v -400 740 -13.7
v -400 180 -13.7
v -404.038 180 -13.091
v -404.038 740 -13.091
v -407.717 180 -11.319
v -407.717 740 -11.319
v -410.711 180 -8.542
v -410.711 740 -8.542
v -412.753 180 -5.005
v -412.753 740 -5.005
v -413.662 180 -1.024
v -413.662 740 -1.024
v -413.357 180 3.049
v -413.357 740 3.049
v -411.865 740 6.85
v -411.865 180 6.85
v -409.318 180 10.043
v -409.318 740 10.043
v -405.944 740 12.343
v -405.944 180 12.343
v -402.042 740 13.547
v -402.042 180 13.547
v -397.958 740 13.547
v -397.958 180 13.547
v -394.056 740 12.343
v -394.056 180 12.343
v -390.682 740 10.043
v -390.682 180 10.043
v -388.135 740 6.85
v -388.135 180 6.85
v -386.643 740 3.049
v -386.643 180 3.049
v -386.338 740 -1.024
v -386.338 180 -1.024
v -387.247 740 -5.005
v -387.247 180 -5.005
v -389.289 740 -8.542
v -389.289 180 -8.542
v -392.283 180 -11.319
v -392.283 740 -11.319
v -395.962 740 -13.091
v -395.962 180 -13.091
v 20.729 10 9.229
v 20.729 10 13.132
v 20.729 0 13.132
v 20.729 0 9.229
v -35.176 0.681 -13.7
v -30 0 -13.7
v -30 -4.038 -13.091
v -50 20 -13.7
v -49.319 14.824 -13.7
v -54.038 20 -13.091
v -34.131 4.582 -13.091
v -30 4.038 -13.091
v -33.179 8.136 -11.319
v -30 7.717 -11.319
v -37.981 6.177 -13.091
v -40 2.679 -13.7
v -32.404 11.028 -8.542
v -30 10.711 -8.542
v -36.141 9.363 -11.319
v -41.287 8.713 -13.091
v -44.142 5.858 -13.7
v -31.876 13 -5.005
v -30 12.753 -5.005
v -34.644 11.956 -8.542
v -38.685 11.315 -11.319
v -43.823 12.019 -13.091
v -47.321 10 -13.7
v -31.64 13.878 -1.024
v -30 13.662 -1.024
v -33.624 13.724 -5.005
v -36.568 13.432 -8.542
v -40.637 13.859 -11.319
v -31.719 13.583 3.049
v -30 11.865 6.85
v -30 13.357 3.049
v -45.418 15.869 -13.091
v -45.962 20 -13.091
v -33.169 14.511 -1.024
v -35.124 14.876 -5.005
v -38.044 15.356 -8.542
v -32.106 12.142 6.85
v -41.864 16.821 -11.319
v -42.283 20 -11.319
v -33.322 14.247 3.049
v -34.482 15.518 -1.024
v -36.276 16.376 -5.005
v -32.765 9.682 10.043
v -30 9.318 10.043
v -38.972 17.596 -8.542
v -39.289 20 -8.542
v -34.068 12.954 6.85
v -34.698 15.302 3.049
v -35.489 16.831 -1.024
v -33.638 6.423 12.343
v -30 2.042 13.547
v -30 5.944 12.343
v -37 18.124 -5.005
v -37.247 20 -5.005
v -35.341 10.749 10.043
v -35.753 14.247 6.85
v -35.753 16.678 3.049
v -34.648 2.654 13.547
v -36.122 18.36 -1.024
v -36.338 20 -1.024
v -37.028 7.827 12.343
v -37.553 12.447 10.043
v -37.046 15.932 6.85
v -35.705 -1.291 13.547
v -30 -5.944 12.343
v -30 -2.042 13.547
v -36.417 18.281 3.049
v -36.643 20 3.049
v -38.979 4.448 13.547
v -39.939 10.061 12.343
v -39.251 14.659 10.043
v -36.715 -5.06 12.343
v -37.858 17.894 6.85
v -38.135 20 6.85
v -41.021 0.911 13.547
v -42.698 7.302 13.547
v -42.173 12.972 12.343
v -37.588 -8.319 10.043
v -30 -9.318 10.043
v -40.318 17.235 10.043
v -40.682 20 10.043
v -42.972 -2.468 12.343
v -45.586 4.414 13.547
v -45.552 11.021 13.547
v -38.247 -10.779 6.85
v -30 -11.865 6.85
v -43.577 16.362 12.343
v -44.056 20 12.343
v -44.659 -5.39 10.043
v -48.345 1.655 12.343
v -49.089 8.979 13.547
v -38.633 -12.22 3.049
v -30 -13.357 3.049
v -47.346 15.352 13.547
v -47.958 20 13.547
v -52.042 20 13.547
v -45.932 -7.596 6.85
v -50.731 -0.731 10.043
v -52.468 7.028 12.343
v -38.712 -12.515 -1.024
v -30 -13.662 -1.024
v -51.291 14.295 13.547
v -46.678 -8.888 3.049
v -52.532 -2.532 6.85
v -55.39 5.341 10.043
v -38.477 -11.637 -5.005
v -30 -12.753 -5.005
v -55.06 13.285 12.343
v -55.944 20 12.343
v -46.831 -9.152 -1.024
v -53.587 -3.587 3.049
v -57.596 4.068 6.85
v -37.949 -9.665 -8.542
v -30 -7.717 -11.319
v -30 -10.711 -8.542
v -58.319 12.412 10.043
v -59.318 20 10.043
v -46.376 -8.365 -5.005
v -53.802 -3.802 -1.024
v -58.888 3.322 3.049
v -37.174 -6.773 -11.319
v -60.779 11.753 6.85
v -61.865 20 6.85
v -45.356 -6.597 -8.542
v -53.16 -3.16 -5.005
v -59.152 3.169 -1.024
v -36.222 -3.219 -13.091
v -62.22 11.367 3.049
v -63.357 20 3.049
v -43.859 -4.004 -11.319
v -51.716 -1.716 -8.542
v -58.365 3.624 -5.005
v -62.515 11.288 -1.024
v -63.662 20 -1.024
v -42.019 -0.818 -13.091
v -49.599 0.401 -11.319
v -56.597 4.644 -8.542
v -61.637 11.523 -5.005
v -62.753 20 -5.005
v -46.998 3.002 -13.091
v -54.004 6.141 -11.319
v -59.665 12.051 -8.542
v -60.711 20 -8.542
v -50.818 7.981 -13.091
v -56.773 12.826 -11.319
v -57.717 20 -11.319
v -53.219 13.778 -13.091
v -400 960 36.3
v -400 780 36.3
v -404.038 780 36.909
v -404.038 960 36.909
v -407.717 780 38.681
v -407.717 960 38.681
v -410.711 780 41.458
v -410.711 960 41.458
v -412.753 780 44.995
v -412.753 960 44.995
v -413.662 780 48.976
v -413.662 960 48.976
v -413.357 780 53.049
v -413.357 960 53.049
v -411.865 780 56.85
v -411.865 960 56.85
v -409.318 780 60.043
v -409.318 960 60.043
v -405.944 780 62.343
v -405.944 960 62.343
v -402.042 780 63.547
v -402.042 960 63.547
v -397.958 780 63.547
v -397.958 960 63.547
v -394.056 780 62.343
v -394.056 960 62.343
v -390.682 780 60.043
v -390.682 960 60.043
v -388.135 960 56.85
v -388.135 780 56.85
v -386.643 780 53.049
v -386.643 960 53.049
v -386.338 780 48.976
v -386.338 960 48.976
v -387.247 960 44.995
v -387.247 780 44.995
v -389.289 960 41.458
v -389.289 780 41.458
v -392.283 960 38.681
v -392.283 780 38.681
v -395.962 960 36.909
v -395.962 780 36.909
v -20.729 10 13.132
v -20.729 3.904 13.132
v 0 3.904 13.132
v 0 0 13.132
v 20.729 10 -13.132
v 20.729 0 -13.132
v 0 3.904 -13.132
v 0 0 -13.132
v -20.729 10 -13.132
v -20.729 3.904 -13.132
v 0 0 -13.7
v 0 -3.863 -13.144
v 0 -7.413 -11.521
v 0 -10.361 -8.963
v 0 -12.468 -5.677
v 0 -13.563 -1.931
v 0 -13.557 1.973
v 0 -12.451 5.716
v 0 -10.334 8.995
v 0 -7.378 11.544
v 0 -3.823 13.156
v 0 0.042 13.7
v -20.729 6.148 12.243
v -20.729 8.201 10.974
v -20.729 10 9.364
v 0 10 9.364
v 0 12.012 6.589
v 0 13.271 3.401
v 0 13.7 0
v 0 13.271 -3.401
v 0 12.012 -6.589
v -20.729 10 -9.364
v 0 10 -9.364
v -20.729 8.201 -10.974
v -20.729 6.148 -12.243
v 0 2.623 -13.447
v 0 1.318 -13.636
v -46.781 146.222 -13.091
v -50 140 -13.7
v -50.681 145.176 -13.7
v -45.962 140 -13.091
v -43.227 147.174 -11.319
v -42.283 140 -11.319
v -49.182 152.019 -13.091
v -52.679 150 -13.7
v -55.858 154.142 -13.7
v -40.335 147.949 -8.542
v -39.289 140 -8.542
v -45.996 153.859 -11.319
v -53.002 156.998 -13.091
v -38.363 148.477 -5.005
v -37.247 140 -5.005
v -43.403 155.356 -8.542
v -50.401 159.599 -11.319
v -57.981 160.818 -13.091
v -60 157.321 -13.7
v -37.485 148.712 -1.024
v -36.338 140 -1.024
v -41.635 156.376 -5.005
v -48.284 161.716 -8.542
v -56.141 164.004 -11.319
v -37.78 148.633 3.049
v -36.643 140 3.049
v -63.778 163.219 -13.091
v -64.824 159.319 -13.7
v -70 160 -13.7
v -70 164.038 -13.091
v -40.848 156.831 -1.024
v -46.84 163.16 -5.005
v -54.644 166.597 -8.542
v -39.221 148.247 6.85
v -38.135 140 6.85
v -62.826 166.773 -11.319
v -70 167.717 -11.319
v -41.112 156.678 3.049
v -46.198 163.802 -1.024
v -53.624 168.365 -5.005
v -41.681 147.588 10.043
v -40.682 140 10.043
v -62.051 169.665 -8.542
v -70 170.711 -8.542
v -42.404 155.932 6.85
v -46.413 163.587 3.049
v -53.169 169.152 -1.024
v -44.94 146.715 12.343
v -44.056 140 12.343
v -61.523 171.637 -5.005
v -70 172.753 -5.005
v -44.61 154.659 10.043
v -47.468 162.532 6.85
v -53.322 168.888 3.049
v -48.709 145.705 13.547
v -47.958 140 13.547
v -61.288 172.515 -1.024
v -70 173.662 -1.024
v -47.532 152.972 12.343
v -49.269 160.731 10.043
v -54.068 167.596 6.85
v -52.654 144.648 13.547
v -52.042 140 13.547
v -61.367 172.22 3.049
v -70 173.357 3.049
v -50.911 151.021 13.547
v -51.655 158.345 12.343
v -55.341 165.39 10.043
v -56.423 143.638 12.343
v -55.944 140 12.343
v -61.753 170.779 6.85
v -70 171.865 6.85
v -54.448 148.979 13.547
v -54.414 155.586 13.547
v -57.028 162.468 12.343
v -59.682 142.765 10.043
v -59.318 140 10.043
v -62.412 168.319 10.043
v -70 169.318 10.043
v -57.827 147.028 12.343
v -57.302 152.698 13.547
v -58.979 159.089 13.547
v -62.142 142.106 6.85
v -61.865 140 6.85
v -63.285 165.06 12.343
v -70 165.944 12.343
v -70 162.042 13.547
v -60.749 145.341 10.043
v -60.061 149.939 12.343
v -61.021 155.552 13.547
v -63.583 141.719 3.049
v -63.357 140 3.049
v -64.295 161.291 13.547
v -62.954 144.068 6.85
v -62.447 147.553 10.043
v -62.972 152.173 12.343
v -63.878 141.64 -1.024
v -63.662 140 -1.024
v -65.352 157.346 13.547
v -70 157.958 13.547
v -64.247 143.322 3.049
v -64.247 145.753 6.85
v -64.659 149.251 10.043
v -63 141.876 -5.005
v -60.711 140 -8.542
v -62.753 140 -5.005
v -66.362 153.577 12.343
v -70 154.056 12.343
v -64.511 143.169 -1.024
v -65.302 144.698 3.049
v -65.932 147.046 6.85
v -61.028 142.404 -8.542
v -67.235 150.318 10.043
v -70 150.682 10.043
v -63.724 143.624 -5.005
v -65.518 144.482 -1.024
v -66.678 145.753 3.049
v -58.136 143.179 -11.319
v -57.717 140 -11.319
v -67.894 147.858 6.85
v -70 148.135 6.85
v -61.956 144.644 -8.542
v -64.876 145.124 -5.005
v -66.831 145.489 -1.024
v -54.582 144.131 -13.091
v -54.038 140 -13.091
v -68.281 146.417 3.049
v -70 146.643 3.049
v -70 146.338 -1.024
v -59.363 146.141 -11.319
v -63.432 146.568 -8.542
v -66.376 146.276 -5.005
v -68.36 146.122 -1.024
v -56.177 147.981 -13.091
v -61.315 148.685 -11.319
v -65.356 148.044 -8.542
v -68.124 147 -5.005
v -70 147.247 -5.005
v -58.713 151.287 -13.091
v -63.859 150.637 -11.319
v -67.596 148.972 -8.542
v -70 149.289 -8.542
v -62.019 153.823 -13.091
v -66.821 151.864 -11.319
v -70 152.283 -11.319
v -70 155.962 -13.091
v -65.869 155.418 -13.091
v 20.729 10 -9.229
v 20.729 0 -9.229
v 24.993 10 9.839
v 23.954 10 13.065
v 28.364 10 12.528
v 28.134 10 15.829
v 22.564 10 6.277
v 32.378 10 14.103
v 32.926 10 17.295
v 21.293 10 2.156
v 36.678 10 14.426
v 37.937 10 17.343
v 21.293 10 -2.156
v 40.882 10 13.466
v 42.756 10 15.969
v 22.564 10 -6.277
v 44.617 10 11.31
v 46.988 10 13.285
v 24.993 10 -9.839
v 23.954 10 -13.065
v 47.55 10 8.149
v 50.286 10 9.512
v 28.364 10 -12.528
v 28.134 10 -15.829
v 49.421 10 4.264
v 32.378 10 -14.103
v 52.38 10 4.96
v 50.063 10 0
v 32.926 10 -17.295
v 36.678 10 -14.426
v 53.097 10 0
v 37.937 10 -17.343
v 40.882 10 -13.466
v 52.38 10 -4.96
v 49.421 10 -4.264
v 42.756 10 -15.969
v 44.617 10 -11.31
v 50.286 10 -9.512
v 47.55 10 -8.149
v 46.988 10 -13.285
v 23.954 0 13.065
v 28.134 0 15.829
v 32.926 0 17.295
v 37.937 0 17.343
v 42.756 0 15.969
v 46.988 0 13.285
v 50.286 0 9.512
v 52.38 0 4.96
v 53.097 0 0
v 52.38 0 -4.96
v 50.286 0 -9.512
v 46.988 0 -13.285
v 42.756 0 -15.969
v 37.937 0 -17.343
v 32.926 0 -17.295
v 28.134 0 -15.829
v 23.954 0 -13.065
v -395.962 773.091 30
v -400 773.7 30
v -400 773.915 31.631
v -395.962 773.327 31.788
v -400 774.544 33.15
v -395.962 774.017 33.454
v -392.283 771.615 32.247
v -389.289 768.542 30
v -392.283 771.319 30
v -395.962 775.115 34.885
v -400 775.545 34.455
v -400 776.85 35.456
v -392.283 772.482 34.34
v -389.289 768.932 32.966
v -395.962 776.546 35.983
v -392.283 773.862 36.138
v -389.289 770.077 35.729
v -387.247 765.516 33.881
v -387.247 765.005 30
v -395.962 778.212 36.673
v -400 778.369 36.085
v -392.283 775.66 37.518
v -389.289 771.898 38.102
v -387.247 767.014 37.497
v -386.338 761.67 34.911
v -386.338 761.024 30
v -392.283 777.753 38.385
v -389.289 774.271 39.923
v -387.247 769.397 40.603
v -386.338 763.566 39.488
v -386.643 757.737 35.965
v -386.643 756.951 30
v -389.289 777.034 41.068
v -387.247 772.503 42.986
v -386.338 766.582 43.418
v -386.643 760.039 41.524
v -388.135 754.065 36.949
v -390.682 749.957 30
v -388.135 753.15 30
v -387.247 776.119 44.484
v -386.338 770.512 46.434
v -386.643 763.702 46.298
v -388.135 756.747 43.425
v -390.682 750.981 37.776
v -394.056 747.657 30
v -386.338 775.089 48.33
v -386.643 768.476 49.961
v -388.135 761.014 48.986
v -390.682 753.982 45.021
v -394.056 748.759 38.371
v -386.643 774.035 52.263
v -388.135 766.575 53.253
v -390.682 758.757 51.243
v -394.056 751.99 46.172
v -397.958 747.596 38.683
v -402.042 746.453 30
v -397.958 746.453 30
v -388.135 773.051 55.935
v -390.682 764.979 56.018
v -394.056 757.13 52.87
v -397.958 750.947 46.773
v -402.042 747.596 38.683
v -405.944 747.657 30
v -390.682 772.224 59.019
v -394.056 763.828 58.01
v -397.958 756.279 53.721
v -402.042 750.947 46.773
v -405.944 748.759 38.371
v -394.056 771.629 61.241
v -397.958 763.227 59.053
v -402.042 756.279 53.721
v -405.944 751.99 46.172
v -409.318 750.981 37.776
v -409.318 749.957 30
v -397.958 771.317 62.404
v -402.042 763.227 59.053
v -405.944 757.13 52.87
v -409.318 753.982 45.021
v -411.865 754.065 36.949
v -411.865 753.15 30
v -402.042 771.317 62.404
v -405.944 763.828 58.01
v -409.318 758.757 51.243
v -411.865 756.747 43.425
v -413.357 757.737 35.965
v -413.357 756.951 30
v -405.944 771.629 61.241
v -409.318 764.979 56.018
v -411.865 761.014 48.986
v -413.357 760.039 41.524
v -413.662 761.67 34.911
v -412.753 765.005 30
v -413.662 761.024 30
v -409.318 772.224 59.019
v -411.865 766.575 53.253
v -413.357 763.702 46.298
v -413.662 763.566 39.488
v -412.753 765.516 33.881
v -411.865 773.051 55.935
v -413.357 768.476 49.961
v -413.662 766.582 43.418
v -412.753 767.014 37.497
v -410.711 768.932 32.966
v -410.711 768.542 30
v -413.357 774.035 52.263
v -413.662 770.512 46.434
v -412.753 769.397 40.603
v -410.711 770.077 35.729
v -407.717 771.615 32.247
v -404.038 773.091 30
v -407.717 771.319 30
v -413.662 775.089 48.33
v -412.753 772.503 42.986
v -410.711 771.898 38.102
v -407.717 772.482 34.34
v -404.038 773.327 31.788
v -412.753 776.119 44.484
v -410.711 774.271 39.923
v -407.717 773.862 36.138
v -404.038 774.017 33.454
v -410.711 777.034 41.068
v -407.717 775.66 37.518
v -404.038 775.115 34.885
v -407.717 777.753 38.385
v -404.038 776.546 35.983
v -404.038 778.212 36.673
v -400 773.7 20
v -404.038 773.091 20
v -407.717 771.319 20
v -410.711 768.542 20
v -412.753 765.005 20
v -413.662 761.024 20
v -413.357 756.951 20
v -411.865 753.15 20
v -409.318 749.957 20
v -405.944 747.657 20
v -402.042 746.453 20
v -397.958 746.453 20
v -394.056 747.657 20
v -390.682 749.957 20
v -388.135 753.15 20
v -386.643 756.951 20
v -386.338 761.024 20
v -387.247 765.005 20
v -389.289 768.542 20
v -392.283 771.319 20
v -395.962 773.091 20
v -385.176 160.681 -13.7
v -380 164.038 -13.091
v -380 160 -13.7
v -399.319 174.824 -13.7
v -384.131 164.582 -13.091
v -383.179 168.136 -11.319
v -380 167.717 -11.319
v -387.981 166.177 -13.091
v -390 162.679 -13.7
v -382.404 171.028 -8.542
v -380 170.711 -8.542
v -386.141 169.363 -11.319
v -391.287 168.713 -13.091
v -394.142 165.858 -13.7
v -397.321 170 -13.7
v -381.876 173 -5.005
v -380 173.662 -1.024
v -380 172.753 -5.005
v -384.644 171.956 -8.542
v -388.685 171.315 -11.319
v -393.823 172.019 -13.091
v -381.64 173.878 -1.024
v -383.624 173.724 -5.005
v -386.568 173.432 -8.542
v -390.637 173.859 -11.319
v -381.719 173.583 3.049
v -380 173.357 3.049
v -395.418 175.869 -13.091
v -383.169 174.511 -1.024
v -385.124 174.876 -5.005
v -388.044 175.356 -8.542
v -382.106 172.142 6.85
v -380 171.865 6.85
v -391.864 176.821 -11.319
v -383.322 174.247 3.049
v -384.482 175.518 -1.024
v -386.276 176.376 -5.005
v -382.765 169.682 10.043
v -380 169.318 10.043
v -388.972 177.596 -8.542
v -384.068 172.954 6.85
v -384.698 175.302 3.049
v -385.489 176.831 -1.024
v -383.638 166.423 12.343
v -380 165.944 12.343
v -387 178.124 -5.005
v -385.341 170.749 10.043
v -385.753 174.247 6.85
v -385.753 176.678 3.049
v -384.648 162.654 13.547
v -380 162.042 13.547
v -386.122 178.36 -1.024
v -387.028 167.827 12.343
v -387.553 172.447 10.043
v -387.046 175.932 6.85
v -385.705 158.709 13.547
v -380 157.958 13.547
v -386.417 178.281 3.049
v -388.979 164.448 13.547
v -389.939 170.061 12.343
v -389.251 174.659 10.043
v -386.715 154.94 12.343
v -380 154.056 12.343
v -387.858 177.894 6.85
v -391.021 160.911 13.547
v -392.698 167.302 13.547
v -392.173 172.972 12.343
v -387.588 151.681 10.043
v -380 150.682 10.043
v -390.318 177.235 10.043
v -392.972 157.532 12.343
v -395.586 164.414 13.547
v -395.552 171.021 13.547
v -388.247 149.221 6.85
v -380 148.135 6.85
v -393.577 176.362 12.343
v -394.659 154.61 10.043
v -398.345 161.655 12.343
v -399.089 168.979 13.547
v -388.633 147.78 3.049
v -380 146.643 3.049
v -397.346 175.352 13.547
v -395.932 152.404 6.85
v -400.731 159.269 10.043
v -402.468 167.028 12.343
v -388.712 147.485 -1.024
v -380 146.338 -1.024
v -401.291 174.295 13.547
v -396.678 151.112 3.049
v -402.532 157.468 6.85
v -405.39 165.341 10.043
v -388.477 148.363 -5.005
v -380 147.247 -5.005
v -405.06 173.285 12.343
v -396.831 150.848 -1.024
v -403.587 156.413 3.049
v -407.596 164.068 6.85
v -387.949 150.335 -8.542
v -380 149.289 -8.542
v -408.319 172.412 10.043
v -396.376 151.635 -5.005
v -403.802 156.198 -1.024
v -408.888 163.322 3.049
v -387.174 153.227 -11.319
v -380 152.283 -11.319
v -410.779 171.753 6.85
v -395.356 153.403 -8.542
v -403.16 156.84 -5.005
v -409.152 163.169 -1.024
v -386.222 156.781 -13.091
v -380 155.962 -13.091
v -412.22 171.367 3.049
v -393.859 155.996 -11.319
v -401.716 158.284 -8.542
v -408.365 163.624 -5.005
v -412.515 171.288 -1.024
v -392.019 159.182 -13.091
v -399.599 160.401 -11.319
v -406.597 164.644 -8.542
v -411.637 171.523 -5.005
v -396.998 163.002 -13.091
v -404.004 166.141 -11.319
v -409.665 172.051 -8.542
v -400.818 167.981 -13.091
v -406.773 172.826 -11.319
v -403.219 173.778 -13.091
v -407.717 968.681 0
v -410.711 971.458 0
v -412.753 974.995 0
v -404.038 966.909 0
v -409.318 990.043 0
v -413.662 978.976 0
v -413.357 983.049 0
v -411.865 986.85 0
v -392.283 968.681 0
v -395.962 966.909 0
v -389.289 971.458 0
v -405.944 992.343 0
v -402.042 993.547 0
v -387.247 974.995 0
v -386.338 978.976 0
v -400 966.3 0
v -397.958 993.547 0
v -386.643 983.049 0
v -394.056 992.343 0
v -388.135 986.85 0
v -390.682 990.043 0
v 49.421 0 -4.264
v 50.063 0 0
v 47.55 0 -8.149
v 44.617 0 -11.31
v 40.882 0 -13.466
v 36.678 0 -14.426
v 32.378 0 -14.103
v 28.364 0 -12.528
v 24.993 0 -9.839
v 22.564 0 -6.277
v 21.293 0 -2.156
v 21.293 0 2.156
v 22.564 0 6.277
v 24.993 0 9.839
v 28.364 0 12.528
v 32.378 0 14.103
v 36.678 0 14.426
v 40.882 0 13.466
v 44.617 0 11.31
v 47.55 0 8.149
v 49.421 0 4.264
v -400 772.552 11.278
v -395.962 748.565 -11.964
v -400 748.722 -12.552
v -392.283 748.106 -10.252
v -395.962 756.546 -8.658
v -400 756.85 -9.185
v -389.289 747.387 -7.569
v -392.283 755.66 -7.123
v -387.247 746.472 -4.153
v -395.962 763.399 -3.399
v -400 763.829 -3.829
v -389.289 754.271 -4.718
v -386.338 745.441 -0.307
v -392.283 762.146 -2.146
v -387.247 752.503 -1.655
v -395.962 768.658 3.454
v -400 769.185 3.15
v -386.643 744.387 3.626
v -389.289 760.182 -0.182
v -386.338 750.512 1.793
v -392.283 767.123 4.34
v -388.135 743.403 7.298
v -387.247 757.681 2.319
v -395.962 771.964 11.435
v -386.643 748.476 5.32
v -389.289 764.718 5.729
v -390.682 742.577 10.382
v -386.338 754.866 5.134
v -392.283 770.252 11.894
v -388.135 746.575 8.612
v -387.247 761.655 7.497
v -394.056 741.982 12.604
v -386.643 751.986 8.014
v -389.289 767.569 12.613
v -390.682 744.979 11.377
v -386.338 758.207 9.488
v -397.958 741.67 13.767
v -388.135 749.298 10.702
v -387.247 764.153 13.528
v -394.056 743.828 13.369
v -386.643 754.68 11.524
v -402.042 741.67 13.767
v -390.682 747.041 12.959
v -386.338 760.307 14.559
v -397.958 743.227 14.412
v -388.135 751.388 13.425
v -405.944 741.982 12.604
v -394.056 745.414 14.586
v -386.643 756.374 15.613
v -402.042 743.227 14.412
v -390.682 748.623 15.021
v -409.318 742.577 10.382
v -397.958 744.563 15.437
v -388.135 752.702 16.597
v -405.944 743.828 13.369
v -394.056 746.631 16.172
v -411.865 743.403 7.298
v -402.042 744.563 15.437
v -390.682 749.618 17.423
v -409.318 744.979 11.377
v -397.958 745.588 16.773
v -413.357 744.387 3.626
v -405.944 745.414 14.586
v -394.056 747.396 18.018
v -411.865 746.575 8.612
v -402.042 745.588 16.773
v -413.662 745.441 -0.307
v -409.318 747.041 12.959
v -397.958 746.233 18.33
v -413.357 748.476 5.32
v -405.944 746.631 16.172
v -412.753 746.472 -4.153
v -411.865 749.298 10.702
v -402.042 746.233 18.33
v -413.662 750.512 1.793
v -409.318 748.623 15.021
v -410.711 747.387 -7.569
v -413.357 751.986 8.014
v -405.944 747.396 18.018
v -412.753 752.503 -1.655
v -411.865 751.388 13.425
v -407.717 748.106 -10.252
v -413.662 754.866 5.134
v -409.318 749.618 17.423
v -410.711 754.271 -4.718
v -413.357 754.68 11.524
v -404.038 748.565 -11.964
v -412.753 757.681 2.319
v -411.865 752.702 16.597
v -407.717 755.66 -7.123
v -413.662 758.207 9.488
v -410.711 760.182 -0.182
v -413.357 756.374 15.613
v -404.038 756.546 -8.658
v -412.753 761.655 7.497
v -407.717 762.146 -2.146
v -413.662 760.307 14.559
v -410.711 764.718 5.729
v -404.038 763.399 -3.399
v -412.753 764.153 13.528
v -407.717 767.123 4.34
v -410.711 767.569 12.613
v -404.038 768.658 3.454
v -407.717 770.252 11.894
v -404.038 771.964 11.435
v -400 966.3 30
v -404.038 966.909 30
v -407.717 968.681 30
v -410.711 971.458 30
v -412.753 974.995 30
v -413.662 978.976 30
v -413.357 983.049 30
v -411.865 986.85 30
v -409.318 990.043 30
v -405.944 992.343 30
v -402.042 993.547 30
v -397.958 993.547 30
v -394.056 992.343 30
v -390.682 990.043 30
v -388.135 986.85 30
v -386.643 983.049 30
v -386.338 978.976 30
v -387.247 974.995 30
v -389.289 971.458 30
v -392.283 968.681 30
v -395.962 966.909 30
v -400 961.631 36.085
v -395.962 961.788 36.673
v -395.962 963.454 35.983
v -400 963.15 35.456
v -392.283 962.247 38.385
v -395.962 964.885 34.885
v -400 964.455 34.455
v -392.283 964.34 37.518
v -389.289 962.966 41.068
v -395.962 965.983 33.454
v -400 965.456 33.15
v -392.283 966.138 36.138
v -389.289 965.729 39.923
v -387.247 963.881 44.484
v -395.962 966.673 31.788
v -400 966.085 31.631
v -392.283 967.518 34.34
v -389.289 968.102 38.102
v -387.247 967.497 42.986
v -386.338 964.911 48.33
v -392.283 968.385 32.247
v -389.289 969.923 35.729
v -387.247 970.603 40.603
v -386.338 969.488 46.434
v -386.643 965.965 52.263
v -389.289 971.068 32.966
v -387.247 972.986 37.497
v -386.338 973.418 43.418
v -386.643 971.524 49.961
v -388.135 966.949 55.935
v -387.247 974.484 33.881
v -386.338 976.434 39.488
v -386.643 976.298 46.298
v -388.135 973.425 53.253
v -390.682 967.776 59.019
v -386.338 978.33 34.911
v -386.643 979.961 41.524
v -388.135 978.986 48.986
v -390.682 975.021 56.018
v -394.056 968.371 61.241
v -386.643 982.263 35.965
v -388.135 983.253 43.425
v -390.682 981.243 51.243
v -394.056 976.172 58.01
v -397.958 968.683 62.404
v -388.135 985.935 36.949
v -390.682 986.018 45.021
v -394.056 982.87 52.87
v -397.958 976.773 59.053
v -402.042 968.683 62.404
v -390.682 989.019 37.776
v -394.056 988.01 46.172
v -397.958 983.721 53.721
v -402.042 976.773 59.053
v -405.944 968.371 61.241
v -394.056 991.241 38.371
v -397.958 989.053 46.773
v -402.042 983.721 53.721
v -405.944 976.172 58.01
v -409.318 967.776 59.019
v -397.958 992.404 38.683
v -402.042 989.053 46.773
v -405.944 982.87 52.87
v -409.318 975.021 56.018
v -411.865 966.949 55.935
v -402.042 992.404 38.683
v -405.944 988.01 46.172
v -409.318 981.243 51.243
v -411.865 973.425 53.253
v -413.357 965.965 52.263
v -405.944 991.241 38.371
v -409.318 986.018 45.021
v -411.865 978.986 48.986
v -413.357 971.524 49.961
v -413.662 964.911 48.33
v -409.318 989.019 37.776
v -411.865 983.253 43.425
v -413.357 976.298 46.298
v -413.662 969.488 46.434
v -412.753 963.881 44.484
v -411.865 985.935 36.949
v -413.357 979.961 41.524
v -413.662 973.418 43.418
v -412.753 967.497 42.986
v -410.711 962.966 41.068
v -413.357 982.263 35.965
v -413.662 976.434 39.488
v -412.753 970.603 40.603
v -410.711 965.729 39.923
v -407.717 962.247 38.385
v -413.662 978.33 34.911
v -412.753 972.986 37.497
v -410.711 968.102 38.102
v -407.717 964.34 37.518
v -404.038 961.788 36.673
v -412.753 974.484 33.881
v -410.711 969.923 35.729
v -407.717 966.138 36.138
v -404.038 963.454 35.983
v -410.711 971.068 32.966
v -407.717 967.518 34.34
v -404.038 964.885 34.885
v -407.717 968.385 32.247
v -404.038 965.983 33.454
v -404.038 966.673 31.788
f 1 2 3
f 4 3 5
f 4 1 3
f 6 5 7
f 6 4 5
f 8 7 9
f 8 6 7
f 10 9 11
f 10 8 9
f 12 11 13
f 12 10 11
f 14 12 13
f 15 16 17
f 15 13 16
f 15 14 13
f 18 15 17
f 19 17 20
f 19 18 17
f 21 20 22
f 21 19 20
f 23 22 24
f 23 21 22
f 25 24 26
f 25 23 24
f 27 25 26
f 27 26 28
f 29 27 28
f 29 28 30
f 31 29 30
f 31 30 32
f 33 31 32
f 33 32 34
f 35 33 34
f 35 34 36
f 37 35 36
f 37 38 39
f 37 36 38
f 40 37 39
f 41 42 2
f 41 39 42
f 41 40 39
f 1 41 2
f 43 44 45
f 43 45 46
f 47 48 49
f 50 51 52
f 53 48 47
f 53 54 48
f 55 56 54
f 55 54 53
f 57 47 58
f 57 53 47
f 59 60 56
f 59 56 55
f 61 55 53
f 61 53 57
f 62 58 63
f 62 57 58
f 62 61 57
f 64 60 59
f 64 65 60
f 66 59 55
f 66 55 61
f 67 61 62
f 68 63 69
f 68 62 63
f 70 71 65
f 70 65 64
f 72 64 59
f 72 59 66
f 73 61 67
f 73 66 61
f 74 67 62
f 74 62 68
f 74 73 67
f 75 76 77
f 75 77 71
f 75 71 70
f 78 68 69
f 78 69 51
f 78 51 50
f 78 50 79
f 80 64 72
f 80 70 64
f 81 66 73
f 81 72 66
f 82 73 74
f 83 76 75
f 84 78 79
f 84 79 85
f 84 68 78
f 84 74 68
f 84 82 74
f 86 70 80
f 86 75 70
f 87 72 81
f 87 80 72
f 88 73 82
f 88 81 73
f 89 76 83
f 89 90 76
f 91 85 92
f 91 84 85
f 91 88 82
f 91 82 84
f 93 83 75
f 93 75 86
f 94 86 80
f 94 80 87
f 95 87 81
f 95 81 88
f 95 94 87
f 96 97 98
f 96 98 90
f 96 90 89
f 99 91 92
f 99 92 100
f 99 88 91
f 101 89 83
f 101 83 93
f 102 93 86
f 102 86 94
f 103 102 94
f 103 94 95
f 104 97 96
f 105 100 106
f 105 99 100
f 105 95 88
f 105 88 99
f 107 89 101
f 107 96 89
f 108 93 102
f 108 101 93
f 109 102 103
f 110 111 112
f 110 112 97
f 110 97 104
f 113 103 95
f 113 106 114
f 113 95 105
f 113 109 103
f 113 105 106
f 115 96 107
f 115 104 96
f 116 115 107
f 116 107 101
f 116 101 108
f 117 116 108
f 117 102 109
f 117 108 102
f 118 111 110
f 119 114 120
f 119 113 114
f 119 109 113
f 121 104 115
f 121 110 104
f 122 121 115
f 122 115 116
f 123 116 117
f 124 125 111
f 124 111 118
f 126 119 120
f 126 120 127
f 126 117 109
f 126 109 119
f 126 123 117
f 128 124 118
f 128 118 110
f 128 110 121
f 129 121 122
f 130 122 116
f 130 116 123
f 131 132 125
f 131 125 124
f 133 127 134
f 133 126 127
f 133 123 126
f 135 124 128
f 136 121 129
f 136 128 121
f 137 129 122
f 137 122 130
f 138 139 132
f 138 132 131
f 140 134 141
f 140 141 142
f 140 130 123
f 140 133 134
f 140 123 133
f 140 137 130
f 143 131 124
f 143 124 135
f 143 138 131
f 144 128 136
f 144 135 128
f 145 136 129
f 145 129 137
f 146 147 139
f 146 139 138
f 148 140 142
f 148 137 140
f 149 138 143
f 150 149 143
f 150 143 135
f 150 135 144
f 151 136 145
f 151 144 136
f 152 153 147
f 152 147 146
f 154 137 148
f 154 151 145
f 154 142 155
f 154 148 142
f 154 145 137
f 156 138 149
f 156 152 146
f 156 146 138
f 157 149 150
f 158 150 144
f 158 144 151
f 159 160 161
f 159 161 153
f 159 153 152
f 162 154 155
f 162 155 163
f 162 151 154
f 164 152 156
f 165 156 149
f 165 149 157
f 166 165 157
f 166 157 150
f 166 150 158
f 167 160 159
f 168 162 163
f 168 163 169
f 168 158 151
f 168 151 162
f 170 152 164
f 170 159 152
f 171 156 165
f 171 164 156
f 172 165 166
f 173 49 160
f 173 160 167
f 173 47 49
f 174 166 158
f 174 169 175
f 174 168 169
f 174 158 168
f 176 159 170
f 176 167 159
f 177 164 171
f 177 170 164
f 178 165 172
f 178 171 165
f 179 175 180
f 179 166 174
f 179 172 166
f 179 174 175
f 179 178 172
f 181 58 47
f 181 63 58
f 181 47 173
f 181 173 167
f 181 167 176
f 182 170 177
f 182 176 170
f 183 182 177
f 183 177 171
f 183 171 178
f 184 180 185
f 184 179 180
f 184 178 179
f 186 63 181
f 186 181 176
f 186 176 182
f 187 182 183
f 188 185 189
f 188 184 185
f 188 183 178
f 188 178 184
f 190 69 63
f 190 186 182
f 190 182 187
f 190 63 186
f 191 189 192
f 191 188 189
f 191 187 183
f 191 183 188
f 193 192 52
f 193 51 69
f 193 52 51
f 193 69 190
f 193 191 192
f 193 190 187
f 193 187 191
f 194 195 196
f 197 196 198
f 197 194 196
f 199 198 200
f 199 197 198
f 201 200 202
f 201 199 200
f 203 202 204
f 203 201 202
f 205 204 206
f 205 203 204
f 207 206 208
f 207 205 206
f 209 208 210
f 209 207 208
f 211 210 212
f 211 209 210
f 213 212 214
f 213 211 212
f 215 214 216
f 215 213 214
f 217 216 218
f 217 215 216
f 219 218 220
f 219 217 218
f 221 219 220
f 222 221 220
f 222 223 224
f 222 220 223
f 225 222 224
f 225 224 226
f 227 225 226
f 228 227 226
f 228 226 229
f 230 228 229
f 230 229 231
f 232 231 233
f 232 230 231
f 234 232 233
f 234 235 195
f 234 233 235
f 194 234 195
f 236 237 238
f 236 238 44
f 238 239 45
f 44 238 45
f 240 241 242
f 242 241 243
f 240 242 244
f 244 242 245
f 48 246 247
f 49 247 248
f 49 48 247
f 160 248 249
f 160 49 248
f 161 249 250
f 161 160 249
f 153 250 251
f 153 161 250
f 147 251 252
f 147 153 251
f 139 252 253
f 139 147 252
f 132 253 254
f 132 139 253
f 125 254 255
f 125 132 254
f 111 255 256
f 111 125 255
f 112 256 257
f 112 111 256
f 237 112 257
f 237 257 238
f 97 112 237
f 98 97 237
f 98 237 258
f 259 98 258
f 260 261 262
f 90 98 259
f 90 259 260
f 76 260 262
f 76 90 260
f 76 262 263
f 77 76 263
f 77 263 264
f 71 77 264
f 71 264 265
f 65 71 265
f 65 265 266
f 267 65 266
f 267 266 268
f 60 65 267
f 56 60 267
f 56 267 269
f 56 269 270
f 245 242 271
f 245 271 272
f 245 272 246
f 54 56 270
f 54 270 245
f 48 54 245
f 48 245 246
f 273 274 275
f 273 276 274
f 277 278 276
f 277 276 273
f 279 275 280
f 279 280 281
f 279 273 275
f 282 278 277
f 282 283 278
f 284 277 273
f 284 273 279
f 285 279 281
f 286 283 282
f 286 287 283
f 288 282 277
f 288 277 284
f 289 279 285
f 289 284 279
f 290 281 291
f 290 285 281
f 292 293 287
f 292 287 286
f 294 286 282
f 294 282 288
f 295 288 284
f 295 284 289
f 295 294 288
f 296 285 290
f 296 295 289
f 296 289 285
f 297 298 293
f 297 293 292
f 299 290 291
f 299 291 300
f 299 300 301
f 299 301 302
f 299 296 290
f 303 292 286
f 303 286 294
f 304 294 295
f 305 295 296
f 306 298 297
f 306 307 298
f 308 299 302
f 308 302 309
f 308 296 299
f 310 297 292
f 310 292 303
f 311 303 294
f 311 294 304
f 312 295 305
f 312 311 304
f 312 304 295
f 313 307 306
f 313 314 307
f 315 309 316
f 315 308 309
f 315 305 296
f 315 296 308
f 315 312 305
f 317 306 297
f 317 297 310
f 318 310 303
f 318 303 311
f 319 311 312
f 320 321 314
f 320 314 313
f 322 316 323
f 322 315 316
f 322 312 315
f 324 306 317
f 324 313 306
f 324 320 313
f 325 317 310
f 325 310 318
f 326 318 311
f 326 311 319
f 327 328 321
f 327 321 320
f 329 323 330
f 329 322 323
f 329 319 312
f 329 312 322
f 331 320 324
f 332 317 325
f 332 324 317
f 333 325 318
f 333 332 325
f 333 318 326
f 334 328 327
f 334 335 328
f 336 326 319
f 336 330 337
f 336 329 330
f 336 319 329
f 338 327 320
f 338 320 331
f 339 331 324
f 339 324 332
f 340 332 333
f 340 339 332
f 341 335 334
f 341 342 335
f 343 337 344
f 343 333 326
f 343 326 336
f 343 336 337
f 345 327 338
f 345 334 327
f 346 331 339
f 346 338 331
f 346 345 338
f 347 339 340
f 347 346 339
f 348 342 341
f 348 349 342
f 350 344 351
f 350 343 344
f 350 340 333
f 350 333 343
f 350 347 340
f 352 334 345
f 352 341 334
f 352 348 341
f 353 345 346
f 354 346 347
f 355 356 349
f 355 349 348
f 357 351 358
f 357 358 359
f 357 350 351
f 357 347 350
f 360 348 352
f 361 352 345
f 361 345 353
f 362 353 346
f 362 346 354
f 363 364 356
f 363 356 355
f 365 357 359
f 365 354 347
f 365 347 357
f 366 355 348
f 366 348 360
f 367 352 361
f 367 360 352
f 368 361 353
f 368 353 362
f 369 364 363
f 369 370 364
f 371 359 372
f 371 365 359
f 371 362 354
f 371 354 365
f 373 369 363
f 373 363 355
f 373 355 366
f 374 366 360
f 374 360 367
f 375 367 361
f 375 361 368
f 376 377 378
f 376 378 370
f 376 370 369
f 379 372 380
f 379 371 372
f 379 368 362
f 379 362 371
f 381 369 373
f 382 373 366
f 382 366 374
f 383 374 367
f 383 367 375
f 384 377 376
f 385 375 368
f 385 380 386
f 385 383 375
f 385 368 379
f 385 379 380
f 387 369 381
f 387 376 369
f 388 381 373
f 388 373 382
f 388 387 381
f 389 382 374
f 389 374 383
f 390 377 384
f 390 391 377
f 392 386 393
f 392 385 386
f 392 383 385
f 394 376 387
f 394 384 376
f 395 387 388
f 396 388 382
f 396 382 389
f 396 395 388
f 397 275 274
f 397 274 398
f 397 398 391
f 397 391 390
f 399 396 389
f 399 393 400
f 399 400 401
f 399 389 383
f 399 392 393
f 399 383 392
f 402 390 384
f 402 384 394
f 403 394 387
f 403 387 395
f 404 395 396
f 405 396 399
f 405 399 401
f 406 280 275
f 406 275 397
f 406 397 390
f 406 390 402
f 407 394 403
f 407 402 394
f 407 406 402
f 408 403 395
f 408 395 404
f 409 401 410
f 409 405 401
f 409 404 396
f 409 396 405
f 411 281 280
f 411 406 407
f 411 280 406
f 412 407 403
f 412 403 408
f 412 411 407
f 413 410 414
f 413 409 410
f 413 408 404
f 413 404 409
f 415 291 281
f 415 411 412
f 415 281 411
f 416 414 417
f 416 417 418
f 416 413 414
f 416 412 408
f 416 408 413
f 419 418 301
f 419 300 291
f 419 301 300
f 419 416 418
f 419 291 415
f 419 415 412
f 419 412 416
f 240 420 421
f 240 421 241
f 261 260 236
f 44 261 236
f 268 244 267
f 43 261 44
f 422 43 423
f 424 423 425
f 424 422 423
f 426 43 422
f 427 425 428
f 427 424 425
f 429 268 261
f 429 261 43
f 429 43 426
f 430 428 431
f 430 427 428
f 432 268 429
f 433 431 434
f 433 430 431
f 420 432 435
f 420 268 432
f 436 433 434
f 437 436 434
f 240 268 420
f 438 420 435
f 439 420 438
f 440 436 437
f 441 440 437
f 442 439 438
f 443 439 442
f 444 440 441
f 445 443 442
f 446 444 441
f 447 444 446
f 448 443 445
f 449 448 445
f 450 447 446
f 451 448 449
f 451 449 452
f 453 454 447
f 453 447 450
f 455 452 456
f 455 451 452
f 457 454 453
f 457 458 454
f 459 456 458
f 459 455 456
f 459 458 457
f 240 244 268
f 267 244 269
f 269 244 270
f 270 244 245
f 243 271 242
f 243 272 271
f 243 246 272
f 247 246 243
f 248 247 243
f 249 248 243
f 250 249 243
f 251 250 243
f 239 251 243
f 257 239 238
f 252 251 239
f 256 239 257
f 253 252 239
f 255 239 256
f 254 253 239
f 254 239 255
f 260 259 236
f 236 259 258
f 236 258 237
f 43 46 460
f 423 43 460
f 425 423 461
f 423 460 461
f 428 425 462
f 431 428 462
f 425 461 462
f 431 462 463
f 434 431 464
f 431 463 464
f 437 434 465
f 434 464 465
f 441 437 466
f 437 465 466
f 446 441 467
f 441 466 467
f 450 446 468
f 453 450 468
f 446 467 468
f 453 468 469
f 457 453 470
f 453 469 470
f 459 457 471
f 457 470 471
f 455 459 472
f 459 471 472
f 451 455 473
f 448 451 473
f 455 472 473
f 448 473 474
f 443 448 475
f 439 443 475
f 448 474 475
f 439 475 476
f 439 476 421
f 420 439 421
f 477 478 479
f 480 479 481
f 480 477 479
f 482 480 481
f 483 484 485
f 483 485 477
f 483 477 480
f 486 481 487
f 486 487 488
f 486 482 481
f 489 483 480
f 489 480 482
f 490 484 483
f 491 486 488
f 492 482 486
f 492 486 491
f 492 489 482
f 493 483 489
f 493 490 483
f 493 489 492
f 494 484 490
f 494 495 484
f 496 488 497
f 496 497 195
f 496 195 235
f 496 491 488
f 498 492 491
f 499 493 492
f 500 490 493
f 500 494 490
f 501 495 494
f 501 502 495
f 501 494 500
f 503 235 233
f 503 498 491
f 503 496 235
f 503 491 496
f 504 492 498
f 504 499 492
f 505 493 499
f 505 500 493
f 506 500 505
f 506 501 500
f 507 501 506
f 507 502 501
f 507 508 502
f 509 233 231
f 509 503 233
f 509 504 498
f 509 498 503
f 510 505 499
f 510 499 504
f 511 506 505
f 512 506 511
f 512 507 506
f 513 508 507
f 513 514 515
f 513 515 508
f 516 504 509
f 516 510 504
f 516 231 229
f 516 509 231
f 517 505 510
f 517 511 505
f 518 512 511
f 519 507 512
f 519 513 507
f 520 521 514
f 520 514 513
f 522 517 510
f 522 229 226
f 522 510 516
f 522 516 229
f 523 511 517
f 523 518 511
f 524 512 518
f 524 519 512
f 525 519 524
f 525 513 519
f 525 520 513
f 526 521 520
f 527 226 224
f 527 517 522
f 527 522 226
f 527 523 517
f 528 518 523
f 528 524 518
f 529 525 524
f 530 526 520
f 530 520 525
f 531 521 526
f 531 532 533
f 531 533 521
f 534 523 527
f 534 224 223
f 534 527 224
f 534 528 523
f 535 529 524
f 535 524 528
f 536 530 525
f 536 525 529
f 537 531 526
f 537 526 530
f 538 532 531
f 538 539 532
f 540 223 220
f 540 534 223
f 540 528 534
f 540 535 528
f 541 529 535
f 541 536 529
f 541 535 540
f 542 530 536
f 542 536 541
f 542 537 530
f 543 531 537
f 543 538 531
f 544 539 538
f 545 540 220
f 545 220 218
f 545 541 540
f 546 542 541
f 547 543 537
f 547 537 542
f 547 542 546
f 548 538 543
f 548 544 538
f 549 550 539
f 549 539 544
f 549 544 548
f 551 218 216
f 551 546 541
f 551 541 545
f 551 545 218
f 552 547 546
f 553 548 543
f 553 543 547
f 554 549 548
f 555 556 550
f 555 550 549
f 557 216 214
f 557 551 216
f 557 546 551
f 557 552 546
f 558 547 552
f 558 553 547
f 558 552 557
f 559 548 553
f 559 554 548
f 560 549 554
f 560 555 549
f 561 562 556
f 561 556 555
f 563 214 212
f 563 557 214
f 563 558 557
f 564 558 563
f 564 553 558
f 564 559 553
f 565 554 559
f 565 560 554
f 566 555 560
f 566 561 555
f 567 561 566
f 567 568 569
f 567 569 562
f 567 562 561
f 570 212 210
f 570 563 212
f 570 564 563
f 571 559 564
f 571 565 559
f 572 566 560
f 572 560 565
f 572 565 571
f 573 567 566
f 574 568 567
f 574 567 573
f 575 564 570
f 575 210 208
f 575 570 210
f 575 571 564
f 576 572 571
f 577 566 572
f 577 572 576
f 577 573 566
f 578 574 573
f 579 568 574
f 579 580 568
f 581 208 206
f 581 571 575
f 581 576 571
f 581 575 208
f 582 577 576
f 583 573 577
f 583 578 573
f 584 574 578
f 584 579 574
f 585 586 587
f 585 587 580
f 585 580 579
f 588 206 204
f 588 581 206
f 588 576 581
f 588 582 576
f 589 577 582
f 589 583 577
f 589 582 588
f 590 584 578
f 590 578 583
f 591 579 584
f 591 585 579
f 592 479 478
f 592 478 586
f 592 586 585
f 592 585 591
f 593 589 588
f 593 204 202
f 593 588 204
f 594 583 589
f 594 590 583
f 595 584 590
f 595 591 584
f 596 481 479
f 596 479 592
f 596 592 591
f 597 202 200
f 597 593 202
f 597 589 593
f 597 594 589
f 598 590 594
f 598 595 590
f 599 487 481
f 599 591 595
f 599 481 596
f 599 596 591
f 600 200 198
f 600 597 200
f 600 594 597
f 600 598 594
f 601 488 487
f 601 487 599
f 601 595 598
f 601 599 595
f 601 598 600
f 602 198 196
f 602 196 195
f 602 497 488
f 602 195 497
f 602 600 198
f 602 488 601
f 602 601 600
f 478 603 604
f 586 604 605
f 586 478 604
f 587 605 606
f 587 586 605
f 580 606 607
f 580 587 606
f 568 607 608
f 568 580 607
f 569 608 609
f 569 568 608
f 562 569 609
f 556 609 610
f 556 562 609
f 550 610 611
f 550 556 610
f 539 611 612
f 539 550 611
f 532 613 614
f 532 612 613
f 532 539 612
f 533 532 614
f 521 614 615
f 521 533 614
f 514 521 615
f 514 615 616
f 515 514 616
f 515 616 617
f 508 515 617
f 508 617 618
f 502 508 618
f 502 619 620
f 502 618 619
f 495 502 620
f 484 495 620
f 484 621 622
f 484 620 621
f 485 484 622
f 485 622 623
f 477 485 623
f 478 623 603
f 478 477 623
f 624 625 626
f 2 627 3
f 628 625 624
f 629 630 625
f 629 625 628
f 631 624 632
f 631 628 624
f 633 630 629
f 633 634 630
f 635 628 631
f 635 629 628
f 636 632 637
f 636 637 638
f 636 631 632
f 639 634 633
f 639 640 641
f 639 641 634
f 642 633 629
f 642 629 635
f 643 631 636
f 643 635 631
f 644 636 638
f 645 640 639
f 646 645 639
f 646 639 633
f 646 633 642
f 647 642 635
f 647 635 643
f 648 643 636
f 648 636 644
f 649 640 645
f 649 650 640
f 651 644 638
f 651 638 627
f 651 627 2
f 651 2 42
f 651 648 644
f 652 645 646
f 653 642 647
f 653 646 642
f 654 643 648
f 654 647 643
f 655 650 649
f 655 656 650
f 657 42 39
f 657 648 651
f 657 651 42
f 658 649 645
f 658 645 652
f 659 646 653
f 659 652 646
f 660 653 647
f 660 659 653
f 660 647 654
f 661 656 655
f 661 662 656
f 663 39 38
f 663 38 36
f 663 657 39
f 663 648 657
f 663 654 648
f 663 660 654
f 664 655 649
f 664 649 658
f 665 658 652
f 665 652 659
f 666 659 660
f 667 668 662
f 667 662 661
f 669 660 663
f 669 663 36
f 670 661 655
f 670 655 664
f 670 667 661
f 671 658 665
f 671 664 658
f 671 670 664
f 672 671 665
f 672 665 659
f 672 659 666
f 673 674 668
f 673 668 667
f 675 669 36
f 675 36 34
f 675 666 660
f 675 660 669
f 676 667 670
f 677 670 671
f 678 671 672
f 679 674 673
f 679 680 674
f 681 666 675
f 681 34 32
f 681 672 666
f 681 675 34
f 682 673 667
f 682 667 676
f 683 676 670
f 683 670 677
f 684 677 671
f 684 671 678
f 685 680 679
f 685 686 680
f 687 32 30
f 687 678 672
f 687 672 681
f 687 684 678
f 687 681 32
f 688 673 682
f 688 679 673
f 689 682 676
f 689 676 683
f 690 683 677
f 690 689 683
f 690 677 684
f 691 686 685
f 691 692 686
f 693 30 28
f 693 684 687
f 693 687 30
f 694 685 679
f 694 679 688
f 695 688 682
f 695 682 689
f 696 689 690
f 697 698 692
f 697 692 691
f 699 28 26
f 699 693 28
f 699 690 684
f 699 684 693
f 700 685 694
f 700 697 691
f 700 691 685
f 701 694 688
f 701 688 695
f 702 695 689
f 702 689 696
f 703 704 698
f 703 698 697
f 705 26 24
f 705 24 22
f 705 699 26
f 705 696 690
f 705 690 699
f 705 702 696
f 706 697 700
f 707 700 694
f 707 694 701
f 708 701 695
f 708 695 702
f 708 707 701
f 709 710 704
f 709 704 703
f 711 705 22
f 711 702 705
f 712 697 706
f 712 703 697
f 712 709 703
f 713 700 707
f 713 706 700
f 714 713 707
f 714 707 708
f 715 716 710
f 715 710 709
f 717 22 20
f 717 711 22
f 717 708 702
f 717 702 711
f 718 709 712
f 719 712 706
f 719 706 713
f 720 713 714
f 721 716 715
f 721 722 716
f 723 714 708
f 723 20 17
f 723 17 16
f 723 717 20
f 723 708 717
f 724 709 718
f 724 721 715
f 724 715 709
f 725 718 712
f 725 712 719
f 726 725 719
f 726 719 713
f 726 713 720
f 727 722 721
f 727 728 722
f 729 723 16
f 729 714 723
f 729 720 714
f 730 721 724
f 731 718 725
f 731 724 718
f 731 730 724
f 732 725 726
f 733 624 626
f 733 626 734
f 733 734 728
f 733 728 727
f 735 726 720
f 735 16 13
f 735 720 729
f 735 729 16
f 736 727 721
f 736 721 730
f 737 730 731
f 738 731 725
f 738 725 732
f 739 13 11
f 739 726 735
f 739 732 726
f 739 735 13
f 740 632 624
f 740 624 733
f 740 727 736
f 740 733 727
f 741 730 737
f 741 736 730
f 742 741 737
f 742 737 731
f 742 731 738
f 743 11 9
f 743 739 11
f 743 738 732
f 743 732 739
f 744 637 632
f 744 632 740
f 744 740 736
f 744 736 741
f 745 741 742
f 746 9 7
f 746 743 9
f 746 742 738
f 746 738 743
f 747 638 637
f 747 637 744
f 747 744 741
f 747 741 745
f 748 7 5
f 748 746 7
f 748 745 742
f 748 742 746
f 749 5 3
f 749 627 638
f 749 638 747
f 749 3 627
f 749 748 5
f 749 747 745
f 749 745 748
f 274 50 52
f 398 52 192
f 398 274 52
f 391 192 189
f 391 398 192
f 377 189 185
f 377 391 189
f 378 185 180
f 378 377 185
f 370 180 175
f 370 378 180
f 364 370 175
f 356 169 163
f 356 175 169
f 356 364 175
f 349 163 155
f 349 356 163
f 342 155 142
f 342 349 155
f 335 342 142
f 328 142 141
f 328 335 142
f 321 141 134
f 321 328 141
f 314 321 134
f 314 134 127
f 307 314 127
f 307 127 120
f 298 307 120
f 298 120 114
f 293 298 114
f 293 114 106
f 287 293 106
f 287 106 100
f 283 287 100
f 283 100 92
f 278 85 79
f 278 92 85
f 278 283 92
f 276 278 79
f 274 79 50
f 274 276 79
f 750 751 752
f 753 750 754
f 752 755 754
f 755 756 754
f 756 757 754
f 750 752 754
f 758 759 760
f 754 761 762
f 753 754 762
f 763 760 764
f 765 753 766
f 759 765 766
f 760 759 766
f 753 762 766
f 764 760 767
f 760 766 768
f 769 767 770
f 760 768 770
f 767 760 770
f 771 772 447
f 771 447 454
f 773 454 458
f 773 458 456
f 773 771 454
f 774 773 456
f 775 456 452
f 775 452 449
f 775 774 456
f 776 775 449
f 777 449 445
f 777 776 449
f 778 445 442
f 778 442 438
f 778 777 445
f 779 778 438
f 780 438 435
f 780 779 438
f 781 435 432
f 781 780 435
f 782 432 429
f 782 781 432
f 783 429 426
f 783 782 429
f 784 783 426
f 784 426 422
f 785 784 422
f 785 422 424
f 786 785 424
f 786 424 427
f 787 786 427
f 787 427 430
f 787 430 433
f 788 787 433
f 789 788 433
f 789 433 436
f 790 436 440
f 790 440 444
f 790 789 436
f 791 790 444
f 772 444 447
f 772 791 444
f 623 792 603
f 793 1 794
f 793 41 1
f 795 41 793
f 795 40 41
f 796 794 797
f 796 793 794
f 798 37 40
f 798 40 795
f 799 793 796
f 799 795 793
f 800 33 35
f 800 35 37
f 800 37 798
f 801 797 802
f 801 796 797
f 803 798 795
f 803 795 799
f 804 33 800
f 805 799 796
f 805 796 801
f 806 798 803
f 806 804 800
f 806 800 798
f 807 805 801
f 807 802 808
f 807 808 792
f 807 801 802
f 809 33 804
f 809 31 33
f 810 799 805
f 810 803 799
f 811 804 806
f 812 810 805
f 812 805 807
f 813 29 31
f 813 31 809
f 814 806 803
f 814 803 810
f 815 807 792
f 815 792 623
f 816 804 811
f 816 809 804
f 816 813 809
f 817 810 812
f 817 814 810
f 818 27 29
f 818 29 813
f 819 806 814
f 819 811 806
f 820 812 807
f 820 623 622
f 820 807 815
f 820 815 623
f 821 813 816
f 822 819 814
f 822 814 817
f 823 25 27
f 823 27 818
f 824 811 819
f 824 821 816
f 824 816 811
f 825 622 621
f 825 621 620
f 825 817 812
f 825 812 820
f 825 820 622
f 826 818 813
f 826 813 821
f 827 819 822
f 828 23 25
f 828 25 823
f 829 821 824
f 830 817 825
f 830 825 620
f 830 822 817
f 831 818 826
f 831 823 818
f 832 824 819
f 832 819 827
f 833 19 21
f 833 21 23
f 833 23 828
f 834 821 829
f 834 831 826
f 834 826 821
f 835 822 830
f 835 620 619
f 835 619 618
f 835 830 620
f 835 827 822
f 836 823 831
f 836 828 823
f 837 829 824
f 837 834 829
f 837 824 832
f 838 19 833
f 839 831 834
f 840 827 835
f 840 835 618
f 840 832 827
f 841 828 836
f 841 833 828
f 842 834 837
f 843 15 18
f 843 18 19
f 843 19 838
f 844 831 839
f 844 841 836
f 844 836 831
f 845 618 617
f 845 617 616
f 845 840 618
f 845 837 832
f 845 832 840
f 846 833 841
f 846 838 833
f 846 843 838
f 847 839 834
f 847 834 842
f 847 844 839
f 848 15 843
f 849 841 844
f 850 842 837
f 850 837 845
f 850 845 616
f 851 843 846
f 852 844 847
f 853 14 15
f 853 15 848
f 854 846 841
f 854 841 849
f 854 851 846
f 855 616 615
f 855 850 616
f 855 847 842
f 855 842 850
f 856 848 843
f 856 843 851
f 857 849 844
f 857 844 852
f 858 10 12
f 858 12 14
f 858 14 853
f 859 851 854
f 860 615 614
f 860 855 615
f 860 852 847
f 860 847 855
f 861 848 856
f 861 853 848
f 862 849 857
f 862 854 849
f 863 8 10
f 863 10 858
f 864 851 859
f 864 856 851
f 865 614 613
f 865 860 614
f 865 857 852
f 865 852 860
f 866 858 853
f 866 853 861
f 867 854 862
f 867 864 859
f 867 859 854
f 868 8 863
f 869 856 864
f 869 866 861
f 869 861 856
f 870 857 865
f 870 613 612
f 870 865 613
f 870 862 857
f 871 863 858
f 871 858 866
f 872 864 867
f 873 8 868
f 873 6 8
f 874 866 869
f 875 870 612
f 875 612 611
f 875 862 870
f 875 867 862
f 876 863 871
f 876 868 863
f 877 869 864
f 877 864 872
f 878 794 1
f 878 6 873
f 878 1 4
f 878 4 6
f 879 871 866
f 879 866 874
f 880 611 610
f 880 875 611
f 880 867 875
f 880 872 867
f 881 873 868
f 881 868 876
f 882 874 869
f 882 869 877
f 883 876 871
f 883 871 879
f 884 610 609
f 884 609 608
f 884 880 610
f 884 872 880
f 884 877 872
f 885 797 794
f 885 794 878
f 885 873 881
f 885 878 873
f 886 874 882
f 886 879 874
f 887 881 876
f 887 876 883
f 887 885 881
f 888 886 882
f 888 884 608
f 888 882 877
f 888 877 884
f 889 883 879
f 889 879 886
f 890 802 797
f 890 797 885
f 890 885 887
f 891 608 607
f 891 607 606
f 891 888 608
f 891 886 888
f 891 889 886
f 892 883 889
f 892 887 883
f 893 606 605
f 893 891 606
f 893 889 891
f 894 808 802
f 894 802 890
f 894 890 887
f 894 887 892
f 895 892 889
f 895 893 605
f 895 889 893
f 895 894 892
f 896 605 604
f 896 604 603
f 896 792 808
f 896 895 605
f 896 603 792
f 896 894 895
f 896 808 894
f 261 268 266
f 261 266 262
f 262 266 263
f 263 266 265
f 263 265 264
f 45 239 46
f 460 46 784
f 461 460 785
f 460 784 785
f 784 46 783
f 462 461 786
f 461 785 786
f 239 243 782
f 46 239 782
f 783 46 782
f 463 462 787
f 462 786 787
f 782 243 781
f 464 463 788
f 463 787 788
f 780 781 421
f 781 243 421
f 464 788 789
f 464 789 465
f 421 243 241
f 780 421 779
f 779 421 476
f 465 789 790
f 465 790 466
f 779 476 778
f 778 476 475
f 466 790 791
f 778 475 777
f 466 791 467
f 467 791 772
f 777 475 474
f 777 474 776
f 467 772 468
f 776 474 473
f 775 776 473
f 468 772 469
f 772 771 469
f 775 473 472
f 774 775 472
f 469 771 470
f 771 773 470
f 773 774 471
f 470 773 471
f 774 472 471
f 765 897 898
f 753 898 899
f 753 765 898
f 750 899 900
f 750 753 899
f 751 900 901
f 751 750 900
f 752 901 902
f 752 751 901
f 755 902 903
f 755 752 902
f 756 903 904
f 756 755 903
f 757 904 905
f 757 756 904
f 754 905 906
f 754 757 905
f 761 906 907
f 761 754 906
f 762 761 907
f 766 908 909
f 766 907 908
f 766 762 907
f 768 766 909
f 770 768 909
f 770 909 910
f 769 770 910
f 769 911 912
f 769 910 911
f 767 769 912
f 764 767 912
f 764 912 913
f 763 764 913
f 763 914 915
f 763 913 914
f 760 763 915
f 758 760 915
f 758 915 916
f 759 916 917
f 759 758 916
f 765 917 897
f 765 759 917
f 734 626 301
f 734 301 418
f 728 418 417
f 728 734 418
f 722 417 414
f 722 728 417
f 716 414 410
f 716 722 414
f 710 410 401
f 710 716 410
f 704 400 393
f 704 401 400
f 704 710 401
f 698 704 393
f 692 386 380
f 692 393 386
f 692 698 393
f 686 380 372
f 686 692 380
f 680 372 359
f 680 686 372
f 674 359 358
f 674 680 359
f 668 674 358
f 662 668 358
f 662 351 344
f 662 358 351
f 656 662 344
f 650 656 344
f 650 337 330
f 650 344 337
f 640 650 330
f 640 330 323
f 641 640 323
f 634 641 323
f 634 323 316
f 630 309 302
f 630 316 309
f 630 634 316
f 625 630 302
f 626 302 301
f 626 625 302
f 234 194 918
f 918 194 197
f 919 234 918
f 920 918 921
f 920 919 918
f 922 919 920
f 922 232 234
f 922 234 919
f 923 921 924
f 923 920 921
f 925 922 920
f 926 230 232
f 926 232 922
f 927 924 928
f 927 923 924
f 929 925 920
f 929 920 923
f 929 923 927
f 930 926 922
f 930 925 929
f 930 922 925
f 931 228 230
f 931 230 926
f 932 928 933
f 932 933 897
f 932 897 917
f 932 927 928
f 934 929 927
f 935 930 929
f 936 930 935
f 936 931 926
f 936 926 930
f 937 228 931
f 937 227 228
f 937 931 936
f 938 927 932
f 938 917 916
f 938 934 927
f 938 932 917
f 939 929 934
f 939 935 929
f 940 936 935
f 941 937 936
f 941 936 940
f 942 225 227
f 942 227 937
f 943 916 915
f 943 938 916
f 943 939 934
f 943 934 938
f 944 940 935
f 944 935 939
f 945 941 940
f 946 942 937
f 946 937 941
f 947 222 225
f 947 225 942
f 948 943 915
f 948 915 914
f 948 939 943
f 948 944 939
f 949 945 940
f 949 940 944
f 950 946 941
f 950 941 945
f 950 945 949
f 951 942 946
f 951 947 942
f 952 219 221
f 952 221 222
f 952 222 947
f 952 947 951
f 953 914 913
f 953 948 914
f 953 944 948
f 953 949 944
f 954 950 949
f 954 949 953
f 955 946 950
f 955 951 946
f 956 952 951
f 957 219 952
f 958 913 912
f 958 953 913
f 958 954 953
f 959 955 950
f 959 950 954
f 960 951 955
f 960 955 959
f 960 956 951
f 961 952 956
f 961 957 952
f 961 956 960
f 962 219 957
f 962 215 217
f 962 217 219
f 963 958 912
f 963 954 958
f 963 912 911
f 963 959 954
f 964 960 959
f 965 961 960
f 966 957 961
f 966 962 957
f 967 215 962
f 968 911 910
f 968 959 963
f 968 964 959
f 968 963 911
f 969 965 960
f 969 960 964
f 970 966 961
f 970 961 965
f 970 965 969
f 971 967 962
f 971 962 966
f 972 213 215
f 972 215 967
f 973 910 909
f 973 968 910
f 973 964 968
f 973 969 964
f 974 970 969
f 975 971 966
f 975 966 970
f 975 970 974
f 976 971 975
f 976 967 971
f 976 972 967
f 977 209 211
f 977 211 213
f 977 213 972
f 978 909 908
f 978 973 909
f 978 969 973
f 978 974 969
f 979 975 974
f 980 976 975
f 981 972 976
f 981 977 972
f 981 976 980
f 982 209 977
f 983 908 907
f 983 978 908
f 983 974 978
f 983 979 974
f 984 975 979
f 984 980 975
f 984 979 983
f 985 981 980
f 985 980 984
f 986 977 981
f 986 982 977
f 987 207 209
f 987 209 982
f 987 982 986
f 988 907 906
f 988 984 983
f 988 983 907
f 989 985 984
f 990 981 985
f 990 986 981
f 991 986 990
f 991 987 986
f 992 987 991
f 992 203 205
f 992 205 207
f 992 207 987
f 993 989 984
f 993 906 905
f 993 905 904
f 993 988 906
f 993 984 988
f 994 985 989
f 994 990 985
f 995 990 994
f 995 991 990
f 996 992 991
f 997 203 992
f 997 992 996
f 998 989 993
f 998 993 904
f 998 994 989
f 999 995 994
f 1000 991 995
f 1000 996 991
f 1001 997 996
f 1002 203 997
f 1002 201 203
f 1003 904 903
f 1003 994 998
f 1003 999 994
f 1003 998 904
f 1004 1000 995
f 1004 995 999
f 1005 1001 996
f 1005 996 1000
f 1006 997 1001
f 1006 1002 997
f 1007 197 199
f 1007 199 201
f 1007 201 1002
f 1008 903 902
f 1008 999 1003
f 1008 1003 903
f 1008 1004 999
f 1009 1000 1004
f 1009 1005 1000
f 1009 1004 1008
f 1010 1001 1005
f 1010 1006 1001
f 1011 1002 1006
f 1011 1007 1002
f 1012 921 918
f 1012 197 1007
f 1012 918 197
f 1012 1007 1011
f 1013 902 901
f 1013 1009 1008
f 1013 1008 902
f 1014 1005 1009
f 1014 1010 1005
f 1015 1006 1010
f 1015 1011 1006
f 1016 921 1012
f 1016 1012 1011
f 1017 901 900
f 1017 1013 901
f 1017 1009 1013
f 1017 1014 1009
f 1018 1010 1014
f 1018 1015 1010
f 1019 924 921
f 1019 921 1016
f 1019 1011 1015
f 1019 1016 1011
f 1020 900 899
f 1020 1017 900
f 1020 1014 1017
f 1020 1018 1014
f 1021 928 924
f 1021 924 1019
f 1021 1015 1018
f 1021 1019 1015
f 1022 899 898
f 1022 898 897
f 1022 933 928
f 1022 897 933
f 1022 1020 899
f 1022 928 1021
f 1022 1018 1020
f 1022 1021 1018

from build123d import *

# Parameters (mm, degrees)
CROQUIS1_R              = 13.7
CROQUIS2_R              = 17.5
CROQUIS2_R_2            = 14.466023188
SALIENTE_EXTRUIR1_DEPTH = 10


with BuildPart() as part:
    # Barrer1: sweep along a curve in space
    with BuildLine() as barrer1_path:
        Line((0, 0, 0), (-30, 0, 0))
        ThreePointArc((-30, 0, 0), (-44.142135624, 5.857864376, 0), (-50, 20, 0))
        Line((-50, 20, 0), (-50, 140, 0))
        ThreePointArc((-50, 140, 0), (-55.857864376, 154.142135624, 0), (-70, 160, 0))
        Line((-70, 160, 0), (-380, 160, 0))
        ThreePointArc((-380, 160, 0), (-394.142135624, 165.857864376, 0), (-400, 180, 0))
        Line((-400, 180, 0), (-400, 740, 0))
        ThreePointArc((-400, 740, 0), (-400, 754.142135624, 5.857864376), (-400, 760, 20))
        Line((-400, 760, 20), (-400, 760, 30))
        ThreePointArc((-400, 760, 30), (-400, 765.857864376, 44.142135624), (-400, 780, 50))
        Line((-400, 780, 50), (-400, 960, 50))
        ThreePointArc((-400, 960, 50), (-400, 974.142135624, 44.142135624), (-400, 980, 30))
        Line((-400, 980, 30), (-400, 980, 0))
    # Croquis1 → Barrer1 (sweep)
    with BuildSketch(Plane(origin=(0, 0, 0), x_dir=(0, 0, -1), z_dir=(1, 0, 0))):
        Circle(CROQUIS1_R)
    sweep(path=barrer1_path.line)

    # Croquis2 → Saliente-Extruir1 (add)
    with BuildSketch(Plane(origin=(0, 0, 0), x_dir=(1, 0, 0), z_dir=(0, 1, 0))):
        with BuildLine():
            Line((20.728883455, -13.13196188), (20.728883455, -9.22916137))
            ThreePointArc((20.728883455, -9.22916137), (18.097393145, 0), (20.728883455, 9.22916137))
            Line((20.728883455, 9.22916137), (20.728883455, 13.13196188))
            Line((20.728883455, 13.13196188), (-20.728883455, 13.13196188))
            Line((-20.728883455, 13.13196188), (-20.728883455, -13.13196188))
            Line((-20.728883455, -13.13196188), (20.728883455, -13.13196188))
        make_face()
        with Locations((35.597393145, 0)):
            Circle(CROQUIS2_R)
        with Locations((35.597393145, 0)):
            Circle(CROQUIS2_R_2, mode=Mode.SUBTRACT)
    extrude(amount=SALIENTE_EXTRUIR1_DEPTH)


solid = part.part
